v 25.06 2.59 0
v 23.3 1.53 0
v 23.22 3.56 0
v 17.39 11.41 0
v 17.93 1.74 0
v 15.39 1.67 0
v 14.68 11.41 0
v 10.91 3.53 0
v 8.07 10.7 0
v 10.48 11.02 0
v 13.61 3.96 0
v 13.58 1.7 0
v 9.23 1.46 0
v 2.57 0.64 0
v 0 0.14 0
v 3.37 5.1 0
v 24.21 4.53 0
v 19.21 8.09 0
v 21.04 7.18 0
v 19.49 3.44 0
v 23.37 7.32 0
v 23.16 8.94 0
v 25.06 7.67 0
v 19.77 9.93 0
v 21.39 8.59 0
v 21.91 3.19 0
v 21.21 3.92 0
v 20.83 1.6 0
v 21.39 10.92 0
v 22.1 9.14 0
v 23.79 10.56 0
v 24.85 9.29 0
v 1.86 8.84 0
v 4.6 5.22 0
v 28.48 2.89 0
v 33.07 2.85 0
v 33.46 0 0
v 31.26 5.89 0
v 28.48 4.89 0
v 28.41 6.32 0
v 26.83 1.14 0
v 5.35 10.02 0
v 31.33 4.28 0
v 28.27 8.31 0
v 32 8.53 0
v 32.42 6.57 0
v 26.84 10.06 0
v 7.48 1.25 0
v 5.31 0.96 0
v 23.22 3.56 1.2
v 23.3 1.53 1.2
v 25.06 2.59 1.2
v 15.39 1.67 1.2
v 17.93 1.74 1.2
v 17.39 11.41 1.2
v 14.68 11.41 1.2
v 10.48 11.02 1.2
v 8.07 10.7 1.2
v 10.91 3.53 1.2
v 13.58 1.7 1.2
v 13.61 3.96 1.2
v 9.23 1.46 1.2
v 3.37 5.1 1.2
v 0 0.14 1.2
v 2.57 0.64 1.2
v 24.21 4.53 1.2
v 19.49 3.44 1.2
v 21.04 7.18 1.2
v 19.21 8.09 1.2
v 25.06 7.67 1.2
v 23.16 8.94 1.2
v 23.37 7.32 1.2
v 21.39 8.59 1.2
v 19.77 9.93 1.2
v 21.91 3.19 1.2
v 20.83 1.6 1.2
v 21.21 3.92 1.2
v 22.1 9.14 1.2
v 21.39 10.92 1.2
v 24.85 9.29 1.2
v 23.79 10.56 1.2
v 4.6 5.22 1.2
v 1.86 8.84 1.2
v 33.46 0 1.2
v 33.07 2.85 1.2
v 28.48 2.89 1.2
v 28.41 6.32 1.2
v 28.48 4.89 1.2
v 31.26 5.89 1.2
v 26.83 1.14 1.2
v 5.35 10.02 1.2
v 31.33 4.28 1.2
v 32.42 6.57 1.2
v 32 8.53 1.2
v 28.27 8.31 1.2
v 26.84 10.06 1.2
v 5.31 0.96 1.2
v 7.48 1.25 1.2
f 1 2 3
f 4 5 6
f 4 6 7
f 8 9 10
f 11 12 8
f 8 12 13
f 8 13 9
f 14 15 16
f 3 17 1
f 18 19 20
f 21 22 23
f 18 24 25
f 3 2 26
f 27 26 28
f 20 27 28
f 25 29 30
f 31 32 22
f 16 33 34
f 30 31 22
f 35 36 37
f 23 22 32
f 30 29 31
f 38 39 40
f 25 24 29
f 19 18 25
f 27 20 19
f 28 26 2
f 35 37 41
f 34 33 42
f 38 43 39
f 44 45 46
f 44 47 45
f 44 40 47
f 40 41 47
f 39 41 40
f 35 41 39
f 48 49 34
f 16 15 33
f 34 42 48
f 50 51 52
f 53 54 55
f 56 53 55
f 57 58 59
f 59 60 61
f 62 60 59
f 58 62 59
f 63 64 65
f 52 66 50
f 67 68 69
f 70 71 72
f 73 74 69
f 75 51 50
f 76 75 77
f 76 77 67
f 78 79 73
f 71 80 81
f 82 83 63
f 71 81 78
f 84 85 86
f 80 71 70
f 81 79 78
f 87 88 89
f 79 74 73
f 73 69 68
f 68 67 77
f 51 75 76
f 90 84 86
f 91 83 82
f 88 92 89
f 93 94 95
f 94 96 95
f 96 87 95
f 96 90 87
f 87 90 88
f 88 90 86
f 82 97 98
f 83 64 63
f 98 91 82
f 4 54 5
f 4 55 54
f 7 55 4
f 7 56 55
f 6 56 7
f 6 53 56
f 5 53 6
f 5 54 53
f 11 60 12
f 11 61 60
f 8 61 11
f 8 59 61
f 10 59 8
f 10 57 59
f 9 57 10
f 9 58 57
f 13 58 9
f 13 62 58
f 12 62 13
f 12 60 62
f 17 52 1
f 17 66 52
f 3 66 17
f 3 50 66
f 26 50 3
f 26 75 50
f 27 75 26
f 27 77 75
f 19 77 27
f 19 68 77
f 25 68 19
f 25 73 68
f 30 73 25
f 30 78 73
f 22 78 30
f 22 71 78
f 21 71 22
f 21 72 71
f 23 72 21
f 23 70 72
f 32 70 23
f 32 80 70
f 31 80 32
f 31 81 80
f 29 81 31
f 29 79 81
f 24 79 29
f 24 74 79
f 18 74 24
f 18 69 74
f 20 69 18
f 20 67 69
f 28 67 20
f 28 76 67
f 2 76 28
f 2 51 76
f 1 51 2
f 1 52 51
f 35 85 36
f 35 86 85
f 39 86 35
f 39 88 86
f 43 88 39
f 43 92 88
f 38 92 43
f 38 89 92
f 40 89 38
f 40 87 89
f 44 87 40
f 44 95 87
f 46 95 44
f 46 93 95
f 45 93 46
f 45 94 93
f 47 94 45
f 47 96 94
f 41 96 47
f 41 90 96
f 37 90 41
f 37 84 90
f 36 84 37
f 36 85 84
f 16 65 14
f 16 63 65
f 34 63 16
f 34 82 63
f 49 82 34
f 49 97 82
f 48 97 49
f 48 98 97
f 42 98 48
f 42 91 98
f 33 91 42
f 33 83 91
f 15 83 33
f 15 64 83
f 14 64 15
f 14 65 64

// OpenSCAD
// file: generated.scad
// Generated by "ink2scad" inkscape extension. http://nickthecoder.co.uk/software/view/ink2scad
//
// Names are based on the inkscape path's id. Use Shift+Ctrl++O in inkscape to edit the paths' ids.
// For each inkscape path, a variable is created, which defines the path. The data takes the form :
//
//     [ points, paths, [ox,oy], [width,height] ]
//
//     points         : An array of 2D coordinates. Passed to polygon's 'points' parameter.
//     paths          : An array of array of integers. Passed to polygon's 'paths' parameter.
//     [width,height] : The size of the path's bounding box.
//     [left,bottom]  : The position of the path's bottom left corner (When exporting more than one object).
//
// Example simple extrusions : :
//     linear_extrude( height = 10 ) ink2scad( myshape );
//

// Creates a 2D polygon from the data generated by the ink2scad inkscape plugin.
//
// data        : The definition of your shape (see header above for details)
// center      : If true, the polygon is create centered at (0,0)
// relative    : If true, the polygon is created at a position relative to the other generated objects 
// convexity   : Only used during openSCAD's preview mode
//
module ink2scad( data, center=false, relativeTo, convexity=4 )
{
    if ( center ) {
        translate( -data[2]/2 ) polygon( points=data[0], paths=data[1], convexity=convexity );
    } else {
        if ( relativeTo ) {
            translate( data[3] - relativeTo[3] ) polygon( points=data[0], paths=data[1], convexity=convexity );
        } else {
            polygon( points=data[0], paths=data[1], convexity=convexity );
        }
    }
}

//
// Example usage :
// linear_extrude( 10 ) ink2scad( myshape, center=true );
//

filamentGuideOpen = [
    [ [5.13,11.25], [7.12,13.05], [9.34,14.94], [12.14,17.17], [15.35,19.50], [18.80,21.69], [20.55,22.66], [22.30,23.51], [24.01,24.21], [25.68,24.71], [24.50,19.12], [23.98,16.41], [19.24,15.36], [14.35,14.12], [9.56,12.74],   [0,9.52], [0,0], [15.87,0], [15.83,5.69], [15.87,11.90], [20.04,12.98], [23.80,13.86], [27.26,14.55], [30.48,15.07], [33.57,15.45], [36.60,15.70], [39.67,15.83], [42.85,15.87], [42.85,30.16], [41.80,30.16], [38.86,29.99], [36.79,29.74], [34.36,29.35], [31.63,28.78], [28.63,27.98], [25.41,26.93], [22,25.59], [18.45,23.93], [14.80,21.91], [11.09,19.49], [9.22,18.12], [7.36,16.64], [5.50,15.05], [3.65,13.33], [1.81,11.49],   [80.58,11.25], [78.59,13.05], [76.37,14.94], [73.56,17.17], [70.35,19.50], [66.91,21.69], [65.16,22.66], [63.41,23.51], [61.69,24.21], [60.03,24.71], [61.21,19.12], [61.73,16.41], [66.47,15.36], [71.36,14.12], [76.15,12.74],   [85.71,9.52], [85.71,0], [69.84,0], [69.87,5.69], [69.84,11.90], [65.67,12.98], [61.90,13.86], [58.45,14.55], [55.22,15.07], [52.14,15.45], [49.10,15.70], [46.04,15.83], [42.85,15.87], [42.85,30.16], [43.91,30.16], [46.85,29.99], [48.92,29.74], [51.35,29.35], [54.08,28.78], [57.07,27.98], [60.30,26.93], [63.70,25.59], [67.25,23.93], [70.90,21.91], [74.62,19.49], [76.48,18.12], [78.35,16.64], [80.21,15.05], [82.06,13.33], [83.89,11.49] ],
    [ [0,1,2,3,4,5,6,7,8,9,10,11,12,13,14], [15,16,17,18,19,20,21,22,23,24,25,26,27,28,29,30,31,32,33,34,35,36,37,38,39,40,41,42,43,44], [59,58,57,56,55,54,53,52,51,50,49,48,47,46,45], [89,88,87,86,85,84,83,82,81,80,79,78,77,76,75,74,73,72,71,70,69,68,67,66,65,64,63,62,61,60] ],
    [85.71,30.16],
    [35.54,-162.19]
];


alice = [
    [ [25.06,2.59], [23.30,1.53], [20.83,1.60], [19.49,3.44], [19.21,8.09], [19.77,9.93], [21.39,10.92], [23.79,10.56], [24.85,9.29], [25.06,7.67], [23.37,7.32], [23.16,8.94], [22.10,9.14], [21.39,8.59], [21.04,7.18], [21.21,3.92], [21.91,3.19], [23.22,3.56], [24.21,4.53],   [0,0.14], [1.86,8.84], [5.35,10.02], [7.48,1.25], [5.31,0.96], [4.60,5.22], [3.37,5.10], [2.57,0.64],   [8.07,10.70], [9.23,1.46], [13.58,1.70], [13.61,3.96], [10.91,3.53], [10.48,11.02],   [14.68,11.41], [15.39,1.67], [17.93,1.74], [17.39,11.41],   [26.84,10.06], [26.83,1.14], [33.46,0], [33.07,2.85], [28.48,2.89], [28.48,4.89], [31.33,4.28], [31.26,5.89], [28.41,6.32], [28.27,8.31], [32.42,6.57], [32,8.53] ],
    [ [18,17,16,15,14,13,12,11,10,9,8,7,6,5,4,3,2,1,0], [26,25,24,23,22,21,20,19], [27,28,29,30,31,32], [33,34,35,36], [37,38,39,40,41,42,43,44,45,46,47,48] ],
    [33.46,11.41],
    [61.79,-179.08]
];


filamentGuide = [
    [ [0,9.52], [0,0], [15.87,0], [15.83,5.69], [15.87,11.90], [20.04,12.98], [23.80,13.86], [27.26,14.55], [30.48,15.07], [33.57,15.45], [36.60,15.70], [39.67,15.83], [42.85,15.87], [42.85,30.16], [41.80,30.16], [38.86,29.99], [36.79,29.74], [34.36,29.35], [31.63,28.78], [28.63,27.98], [25.41,26.93], [22,25.59], [18.45,23.93], [14.80,21.91], [11.09,19.49], [9.22,18.12], [7.36,16.64], [5.50,15.05], [3.65,13.33], [1.81,11.49],   [85.71,9.52], [85.71,0], [69.84,0], [69.87,5.69], [69.84,11.90], [65.67,12.98], [61.90,13.86], [58.45,14.55], [55.22,15.07], [52.14,15.45], [49.10,15.70], [46.04,15.83], [42.85,15.87], [42.85,30.16], [43.91,30.16], [46.85,29.99], [48.92,29.74], [51.35,29.35], [54.08,28.78], [57.07,27.98], [60.30,26.93], [63.70,25.59], [67.25,23.93], [70.90,21.91], [74.62,19.49], [76.48,18.12], [78.35,16.64], [80.21,15.05], [82.06,13.33], [83.89,11.49] ],
    [ [0,1,2,3,4,5,6,7,8,9,10,11,12,13,14,15,16,17,18,19,20,21,22,23,24,25,26,27,28,29], [59,58,57,56,55,54,53,52,51,50,49,48,47,46,45,44,43,42,41,40,39,38,37,36,35,34,33,32,31,30] ],
    [85.71,30.16],
    [35.54,-196.06]
];
// main file
include <generated.scad>;

linear_extrude( 1.2 ) ink2scad( alice );
